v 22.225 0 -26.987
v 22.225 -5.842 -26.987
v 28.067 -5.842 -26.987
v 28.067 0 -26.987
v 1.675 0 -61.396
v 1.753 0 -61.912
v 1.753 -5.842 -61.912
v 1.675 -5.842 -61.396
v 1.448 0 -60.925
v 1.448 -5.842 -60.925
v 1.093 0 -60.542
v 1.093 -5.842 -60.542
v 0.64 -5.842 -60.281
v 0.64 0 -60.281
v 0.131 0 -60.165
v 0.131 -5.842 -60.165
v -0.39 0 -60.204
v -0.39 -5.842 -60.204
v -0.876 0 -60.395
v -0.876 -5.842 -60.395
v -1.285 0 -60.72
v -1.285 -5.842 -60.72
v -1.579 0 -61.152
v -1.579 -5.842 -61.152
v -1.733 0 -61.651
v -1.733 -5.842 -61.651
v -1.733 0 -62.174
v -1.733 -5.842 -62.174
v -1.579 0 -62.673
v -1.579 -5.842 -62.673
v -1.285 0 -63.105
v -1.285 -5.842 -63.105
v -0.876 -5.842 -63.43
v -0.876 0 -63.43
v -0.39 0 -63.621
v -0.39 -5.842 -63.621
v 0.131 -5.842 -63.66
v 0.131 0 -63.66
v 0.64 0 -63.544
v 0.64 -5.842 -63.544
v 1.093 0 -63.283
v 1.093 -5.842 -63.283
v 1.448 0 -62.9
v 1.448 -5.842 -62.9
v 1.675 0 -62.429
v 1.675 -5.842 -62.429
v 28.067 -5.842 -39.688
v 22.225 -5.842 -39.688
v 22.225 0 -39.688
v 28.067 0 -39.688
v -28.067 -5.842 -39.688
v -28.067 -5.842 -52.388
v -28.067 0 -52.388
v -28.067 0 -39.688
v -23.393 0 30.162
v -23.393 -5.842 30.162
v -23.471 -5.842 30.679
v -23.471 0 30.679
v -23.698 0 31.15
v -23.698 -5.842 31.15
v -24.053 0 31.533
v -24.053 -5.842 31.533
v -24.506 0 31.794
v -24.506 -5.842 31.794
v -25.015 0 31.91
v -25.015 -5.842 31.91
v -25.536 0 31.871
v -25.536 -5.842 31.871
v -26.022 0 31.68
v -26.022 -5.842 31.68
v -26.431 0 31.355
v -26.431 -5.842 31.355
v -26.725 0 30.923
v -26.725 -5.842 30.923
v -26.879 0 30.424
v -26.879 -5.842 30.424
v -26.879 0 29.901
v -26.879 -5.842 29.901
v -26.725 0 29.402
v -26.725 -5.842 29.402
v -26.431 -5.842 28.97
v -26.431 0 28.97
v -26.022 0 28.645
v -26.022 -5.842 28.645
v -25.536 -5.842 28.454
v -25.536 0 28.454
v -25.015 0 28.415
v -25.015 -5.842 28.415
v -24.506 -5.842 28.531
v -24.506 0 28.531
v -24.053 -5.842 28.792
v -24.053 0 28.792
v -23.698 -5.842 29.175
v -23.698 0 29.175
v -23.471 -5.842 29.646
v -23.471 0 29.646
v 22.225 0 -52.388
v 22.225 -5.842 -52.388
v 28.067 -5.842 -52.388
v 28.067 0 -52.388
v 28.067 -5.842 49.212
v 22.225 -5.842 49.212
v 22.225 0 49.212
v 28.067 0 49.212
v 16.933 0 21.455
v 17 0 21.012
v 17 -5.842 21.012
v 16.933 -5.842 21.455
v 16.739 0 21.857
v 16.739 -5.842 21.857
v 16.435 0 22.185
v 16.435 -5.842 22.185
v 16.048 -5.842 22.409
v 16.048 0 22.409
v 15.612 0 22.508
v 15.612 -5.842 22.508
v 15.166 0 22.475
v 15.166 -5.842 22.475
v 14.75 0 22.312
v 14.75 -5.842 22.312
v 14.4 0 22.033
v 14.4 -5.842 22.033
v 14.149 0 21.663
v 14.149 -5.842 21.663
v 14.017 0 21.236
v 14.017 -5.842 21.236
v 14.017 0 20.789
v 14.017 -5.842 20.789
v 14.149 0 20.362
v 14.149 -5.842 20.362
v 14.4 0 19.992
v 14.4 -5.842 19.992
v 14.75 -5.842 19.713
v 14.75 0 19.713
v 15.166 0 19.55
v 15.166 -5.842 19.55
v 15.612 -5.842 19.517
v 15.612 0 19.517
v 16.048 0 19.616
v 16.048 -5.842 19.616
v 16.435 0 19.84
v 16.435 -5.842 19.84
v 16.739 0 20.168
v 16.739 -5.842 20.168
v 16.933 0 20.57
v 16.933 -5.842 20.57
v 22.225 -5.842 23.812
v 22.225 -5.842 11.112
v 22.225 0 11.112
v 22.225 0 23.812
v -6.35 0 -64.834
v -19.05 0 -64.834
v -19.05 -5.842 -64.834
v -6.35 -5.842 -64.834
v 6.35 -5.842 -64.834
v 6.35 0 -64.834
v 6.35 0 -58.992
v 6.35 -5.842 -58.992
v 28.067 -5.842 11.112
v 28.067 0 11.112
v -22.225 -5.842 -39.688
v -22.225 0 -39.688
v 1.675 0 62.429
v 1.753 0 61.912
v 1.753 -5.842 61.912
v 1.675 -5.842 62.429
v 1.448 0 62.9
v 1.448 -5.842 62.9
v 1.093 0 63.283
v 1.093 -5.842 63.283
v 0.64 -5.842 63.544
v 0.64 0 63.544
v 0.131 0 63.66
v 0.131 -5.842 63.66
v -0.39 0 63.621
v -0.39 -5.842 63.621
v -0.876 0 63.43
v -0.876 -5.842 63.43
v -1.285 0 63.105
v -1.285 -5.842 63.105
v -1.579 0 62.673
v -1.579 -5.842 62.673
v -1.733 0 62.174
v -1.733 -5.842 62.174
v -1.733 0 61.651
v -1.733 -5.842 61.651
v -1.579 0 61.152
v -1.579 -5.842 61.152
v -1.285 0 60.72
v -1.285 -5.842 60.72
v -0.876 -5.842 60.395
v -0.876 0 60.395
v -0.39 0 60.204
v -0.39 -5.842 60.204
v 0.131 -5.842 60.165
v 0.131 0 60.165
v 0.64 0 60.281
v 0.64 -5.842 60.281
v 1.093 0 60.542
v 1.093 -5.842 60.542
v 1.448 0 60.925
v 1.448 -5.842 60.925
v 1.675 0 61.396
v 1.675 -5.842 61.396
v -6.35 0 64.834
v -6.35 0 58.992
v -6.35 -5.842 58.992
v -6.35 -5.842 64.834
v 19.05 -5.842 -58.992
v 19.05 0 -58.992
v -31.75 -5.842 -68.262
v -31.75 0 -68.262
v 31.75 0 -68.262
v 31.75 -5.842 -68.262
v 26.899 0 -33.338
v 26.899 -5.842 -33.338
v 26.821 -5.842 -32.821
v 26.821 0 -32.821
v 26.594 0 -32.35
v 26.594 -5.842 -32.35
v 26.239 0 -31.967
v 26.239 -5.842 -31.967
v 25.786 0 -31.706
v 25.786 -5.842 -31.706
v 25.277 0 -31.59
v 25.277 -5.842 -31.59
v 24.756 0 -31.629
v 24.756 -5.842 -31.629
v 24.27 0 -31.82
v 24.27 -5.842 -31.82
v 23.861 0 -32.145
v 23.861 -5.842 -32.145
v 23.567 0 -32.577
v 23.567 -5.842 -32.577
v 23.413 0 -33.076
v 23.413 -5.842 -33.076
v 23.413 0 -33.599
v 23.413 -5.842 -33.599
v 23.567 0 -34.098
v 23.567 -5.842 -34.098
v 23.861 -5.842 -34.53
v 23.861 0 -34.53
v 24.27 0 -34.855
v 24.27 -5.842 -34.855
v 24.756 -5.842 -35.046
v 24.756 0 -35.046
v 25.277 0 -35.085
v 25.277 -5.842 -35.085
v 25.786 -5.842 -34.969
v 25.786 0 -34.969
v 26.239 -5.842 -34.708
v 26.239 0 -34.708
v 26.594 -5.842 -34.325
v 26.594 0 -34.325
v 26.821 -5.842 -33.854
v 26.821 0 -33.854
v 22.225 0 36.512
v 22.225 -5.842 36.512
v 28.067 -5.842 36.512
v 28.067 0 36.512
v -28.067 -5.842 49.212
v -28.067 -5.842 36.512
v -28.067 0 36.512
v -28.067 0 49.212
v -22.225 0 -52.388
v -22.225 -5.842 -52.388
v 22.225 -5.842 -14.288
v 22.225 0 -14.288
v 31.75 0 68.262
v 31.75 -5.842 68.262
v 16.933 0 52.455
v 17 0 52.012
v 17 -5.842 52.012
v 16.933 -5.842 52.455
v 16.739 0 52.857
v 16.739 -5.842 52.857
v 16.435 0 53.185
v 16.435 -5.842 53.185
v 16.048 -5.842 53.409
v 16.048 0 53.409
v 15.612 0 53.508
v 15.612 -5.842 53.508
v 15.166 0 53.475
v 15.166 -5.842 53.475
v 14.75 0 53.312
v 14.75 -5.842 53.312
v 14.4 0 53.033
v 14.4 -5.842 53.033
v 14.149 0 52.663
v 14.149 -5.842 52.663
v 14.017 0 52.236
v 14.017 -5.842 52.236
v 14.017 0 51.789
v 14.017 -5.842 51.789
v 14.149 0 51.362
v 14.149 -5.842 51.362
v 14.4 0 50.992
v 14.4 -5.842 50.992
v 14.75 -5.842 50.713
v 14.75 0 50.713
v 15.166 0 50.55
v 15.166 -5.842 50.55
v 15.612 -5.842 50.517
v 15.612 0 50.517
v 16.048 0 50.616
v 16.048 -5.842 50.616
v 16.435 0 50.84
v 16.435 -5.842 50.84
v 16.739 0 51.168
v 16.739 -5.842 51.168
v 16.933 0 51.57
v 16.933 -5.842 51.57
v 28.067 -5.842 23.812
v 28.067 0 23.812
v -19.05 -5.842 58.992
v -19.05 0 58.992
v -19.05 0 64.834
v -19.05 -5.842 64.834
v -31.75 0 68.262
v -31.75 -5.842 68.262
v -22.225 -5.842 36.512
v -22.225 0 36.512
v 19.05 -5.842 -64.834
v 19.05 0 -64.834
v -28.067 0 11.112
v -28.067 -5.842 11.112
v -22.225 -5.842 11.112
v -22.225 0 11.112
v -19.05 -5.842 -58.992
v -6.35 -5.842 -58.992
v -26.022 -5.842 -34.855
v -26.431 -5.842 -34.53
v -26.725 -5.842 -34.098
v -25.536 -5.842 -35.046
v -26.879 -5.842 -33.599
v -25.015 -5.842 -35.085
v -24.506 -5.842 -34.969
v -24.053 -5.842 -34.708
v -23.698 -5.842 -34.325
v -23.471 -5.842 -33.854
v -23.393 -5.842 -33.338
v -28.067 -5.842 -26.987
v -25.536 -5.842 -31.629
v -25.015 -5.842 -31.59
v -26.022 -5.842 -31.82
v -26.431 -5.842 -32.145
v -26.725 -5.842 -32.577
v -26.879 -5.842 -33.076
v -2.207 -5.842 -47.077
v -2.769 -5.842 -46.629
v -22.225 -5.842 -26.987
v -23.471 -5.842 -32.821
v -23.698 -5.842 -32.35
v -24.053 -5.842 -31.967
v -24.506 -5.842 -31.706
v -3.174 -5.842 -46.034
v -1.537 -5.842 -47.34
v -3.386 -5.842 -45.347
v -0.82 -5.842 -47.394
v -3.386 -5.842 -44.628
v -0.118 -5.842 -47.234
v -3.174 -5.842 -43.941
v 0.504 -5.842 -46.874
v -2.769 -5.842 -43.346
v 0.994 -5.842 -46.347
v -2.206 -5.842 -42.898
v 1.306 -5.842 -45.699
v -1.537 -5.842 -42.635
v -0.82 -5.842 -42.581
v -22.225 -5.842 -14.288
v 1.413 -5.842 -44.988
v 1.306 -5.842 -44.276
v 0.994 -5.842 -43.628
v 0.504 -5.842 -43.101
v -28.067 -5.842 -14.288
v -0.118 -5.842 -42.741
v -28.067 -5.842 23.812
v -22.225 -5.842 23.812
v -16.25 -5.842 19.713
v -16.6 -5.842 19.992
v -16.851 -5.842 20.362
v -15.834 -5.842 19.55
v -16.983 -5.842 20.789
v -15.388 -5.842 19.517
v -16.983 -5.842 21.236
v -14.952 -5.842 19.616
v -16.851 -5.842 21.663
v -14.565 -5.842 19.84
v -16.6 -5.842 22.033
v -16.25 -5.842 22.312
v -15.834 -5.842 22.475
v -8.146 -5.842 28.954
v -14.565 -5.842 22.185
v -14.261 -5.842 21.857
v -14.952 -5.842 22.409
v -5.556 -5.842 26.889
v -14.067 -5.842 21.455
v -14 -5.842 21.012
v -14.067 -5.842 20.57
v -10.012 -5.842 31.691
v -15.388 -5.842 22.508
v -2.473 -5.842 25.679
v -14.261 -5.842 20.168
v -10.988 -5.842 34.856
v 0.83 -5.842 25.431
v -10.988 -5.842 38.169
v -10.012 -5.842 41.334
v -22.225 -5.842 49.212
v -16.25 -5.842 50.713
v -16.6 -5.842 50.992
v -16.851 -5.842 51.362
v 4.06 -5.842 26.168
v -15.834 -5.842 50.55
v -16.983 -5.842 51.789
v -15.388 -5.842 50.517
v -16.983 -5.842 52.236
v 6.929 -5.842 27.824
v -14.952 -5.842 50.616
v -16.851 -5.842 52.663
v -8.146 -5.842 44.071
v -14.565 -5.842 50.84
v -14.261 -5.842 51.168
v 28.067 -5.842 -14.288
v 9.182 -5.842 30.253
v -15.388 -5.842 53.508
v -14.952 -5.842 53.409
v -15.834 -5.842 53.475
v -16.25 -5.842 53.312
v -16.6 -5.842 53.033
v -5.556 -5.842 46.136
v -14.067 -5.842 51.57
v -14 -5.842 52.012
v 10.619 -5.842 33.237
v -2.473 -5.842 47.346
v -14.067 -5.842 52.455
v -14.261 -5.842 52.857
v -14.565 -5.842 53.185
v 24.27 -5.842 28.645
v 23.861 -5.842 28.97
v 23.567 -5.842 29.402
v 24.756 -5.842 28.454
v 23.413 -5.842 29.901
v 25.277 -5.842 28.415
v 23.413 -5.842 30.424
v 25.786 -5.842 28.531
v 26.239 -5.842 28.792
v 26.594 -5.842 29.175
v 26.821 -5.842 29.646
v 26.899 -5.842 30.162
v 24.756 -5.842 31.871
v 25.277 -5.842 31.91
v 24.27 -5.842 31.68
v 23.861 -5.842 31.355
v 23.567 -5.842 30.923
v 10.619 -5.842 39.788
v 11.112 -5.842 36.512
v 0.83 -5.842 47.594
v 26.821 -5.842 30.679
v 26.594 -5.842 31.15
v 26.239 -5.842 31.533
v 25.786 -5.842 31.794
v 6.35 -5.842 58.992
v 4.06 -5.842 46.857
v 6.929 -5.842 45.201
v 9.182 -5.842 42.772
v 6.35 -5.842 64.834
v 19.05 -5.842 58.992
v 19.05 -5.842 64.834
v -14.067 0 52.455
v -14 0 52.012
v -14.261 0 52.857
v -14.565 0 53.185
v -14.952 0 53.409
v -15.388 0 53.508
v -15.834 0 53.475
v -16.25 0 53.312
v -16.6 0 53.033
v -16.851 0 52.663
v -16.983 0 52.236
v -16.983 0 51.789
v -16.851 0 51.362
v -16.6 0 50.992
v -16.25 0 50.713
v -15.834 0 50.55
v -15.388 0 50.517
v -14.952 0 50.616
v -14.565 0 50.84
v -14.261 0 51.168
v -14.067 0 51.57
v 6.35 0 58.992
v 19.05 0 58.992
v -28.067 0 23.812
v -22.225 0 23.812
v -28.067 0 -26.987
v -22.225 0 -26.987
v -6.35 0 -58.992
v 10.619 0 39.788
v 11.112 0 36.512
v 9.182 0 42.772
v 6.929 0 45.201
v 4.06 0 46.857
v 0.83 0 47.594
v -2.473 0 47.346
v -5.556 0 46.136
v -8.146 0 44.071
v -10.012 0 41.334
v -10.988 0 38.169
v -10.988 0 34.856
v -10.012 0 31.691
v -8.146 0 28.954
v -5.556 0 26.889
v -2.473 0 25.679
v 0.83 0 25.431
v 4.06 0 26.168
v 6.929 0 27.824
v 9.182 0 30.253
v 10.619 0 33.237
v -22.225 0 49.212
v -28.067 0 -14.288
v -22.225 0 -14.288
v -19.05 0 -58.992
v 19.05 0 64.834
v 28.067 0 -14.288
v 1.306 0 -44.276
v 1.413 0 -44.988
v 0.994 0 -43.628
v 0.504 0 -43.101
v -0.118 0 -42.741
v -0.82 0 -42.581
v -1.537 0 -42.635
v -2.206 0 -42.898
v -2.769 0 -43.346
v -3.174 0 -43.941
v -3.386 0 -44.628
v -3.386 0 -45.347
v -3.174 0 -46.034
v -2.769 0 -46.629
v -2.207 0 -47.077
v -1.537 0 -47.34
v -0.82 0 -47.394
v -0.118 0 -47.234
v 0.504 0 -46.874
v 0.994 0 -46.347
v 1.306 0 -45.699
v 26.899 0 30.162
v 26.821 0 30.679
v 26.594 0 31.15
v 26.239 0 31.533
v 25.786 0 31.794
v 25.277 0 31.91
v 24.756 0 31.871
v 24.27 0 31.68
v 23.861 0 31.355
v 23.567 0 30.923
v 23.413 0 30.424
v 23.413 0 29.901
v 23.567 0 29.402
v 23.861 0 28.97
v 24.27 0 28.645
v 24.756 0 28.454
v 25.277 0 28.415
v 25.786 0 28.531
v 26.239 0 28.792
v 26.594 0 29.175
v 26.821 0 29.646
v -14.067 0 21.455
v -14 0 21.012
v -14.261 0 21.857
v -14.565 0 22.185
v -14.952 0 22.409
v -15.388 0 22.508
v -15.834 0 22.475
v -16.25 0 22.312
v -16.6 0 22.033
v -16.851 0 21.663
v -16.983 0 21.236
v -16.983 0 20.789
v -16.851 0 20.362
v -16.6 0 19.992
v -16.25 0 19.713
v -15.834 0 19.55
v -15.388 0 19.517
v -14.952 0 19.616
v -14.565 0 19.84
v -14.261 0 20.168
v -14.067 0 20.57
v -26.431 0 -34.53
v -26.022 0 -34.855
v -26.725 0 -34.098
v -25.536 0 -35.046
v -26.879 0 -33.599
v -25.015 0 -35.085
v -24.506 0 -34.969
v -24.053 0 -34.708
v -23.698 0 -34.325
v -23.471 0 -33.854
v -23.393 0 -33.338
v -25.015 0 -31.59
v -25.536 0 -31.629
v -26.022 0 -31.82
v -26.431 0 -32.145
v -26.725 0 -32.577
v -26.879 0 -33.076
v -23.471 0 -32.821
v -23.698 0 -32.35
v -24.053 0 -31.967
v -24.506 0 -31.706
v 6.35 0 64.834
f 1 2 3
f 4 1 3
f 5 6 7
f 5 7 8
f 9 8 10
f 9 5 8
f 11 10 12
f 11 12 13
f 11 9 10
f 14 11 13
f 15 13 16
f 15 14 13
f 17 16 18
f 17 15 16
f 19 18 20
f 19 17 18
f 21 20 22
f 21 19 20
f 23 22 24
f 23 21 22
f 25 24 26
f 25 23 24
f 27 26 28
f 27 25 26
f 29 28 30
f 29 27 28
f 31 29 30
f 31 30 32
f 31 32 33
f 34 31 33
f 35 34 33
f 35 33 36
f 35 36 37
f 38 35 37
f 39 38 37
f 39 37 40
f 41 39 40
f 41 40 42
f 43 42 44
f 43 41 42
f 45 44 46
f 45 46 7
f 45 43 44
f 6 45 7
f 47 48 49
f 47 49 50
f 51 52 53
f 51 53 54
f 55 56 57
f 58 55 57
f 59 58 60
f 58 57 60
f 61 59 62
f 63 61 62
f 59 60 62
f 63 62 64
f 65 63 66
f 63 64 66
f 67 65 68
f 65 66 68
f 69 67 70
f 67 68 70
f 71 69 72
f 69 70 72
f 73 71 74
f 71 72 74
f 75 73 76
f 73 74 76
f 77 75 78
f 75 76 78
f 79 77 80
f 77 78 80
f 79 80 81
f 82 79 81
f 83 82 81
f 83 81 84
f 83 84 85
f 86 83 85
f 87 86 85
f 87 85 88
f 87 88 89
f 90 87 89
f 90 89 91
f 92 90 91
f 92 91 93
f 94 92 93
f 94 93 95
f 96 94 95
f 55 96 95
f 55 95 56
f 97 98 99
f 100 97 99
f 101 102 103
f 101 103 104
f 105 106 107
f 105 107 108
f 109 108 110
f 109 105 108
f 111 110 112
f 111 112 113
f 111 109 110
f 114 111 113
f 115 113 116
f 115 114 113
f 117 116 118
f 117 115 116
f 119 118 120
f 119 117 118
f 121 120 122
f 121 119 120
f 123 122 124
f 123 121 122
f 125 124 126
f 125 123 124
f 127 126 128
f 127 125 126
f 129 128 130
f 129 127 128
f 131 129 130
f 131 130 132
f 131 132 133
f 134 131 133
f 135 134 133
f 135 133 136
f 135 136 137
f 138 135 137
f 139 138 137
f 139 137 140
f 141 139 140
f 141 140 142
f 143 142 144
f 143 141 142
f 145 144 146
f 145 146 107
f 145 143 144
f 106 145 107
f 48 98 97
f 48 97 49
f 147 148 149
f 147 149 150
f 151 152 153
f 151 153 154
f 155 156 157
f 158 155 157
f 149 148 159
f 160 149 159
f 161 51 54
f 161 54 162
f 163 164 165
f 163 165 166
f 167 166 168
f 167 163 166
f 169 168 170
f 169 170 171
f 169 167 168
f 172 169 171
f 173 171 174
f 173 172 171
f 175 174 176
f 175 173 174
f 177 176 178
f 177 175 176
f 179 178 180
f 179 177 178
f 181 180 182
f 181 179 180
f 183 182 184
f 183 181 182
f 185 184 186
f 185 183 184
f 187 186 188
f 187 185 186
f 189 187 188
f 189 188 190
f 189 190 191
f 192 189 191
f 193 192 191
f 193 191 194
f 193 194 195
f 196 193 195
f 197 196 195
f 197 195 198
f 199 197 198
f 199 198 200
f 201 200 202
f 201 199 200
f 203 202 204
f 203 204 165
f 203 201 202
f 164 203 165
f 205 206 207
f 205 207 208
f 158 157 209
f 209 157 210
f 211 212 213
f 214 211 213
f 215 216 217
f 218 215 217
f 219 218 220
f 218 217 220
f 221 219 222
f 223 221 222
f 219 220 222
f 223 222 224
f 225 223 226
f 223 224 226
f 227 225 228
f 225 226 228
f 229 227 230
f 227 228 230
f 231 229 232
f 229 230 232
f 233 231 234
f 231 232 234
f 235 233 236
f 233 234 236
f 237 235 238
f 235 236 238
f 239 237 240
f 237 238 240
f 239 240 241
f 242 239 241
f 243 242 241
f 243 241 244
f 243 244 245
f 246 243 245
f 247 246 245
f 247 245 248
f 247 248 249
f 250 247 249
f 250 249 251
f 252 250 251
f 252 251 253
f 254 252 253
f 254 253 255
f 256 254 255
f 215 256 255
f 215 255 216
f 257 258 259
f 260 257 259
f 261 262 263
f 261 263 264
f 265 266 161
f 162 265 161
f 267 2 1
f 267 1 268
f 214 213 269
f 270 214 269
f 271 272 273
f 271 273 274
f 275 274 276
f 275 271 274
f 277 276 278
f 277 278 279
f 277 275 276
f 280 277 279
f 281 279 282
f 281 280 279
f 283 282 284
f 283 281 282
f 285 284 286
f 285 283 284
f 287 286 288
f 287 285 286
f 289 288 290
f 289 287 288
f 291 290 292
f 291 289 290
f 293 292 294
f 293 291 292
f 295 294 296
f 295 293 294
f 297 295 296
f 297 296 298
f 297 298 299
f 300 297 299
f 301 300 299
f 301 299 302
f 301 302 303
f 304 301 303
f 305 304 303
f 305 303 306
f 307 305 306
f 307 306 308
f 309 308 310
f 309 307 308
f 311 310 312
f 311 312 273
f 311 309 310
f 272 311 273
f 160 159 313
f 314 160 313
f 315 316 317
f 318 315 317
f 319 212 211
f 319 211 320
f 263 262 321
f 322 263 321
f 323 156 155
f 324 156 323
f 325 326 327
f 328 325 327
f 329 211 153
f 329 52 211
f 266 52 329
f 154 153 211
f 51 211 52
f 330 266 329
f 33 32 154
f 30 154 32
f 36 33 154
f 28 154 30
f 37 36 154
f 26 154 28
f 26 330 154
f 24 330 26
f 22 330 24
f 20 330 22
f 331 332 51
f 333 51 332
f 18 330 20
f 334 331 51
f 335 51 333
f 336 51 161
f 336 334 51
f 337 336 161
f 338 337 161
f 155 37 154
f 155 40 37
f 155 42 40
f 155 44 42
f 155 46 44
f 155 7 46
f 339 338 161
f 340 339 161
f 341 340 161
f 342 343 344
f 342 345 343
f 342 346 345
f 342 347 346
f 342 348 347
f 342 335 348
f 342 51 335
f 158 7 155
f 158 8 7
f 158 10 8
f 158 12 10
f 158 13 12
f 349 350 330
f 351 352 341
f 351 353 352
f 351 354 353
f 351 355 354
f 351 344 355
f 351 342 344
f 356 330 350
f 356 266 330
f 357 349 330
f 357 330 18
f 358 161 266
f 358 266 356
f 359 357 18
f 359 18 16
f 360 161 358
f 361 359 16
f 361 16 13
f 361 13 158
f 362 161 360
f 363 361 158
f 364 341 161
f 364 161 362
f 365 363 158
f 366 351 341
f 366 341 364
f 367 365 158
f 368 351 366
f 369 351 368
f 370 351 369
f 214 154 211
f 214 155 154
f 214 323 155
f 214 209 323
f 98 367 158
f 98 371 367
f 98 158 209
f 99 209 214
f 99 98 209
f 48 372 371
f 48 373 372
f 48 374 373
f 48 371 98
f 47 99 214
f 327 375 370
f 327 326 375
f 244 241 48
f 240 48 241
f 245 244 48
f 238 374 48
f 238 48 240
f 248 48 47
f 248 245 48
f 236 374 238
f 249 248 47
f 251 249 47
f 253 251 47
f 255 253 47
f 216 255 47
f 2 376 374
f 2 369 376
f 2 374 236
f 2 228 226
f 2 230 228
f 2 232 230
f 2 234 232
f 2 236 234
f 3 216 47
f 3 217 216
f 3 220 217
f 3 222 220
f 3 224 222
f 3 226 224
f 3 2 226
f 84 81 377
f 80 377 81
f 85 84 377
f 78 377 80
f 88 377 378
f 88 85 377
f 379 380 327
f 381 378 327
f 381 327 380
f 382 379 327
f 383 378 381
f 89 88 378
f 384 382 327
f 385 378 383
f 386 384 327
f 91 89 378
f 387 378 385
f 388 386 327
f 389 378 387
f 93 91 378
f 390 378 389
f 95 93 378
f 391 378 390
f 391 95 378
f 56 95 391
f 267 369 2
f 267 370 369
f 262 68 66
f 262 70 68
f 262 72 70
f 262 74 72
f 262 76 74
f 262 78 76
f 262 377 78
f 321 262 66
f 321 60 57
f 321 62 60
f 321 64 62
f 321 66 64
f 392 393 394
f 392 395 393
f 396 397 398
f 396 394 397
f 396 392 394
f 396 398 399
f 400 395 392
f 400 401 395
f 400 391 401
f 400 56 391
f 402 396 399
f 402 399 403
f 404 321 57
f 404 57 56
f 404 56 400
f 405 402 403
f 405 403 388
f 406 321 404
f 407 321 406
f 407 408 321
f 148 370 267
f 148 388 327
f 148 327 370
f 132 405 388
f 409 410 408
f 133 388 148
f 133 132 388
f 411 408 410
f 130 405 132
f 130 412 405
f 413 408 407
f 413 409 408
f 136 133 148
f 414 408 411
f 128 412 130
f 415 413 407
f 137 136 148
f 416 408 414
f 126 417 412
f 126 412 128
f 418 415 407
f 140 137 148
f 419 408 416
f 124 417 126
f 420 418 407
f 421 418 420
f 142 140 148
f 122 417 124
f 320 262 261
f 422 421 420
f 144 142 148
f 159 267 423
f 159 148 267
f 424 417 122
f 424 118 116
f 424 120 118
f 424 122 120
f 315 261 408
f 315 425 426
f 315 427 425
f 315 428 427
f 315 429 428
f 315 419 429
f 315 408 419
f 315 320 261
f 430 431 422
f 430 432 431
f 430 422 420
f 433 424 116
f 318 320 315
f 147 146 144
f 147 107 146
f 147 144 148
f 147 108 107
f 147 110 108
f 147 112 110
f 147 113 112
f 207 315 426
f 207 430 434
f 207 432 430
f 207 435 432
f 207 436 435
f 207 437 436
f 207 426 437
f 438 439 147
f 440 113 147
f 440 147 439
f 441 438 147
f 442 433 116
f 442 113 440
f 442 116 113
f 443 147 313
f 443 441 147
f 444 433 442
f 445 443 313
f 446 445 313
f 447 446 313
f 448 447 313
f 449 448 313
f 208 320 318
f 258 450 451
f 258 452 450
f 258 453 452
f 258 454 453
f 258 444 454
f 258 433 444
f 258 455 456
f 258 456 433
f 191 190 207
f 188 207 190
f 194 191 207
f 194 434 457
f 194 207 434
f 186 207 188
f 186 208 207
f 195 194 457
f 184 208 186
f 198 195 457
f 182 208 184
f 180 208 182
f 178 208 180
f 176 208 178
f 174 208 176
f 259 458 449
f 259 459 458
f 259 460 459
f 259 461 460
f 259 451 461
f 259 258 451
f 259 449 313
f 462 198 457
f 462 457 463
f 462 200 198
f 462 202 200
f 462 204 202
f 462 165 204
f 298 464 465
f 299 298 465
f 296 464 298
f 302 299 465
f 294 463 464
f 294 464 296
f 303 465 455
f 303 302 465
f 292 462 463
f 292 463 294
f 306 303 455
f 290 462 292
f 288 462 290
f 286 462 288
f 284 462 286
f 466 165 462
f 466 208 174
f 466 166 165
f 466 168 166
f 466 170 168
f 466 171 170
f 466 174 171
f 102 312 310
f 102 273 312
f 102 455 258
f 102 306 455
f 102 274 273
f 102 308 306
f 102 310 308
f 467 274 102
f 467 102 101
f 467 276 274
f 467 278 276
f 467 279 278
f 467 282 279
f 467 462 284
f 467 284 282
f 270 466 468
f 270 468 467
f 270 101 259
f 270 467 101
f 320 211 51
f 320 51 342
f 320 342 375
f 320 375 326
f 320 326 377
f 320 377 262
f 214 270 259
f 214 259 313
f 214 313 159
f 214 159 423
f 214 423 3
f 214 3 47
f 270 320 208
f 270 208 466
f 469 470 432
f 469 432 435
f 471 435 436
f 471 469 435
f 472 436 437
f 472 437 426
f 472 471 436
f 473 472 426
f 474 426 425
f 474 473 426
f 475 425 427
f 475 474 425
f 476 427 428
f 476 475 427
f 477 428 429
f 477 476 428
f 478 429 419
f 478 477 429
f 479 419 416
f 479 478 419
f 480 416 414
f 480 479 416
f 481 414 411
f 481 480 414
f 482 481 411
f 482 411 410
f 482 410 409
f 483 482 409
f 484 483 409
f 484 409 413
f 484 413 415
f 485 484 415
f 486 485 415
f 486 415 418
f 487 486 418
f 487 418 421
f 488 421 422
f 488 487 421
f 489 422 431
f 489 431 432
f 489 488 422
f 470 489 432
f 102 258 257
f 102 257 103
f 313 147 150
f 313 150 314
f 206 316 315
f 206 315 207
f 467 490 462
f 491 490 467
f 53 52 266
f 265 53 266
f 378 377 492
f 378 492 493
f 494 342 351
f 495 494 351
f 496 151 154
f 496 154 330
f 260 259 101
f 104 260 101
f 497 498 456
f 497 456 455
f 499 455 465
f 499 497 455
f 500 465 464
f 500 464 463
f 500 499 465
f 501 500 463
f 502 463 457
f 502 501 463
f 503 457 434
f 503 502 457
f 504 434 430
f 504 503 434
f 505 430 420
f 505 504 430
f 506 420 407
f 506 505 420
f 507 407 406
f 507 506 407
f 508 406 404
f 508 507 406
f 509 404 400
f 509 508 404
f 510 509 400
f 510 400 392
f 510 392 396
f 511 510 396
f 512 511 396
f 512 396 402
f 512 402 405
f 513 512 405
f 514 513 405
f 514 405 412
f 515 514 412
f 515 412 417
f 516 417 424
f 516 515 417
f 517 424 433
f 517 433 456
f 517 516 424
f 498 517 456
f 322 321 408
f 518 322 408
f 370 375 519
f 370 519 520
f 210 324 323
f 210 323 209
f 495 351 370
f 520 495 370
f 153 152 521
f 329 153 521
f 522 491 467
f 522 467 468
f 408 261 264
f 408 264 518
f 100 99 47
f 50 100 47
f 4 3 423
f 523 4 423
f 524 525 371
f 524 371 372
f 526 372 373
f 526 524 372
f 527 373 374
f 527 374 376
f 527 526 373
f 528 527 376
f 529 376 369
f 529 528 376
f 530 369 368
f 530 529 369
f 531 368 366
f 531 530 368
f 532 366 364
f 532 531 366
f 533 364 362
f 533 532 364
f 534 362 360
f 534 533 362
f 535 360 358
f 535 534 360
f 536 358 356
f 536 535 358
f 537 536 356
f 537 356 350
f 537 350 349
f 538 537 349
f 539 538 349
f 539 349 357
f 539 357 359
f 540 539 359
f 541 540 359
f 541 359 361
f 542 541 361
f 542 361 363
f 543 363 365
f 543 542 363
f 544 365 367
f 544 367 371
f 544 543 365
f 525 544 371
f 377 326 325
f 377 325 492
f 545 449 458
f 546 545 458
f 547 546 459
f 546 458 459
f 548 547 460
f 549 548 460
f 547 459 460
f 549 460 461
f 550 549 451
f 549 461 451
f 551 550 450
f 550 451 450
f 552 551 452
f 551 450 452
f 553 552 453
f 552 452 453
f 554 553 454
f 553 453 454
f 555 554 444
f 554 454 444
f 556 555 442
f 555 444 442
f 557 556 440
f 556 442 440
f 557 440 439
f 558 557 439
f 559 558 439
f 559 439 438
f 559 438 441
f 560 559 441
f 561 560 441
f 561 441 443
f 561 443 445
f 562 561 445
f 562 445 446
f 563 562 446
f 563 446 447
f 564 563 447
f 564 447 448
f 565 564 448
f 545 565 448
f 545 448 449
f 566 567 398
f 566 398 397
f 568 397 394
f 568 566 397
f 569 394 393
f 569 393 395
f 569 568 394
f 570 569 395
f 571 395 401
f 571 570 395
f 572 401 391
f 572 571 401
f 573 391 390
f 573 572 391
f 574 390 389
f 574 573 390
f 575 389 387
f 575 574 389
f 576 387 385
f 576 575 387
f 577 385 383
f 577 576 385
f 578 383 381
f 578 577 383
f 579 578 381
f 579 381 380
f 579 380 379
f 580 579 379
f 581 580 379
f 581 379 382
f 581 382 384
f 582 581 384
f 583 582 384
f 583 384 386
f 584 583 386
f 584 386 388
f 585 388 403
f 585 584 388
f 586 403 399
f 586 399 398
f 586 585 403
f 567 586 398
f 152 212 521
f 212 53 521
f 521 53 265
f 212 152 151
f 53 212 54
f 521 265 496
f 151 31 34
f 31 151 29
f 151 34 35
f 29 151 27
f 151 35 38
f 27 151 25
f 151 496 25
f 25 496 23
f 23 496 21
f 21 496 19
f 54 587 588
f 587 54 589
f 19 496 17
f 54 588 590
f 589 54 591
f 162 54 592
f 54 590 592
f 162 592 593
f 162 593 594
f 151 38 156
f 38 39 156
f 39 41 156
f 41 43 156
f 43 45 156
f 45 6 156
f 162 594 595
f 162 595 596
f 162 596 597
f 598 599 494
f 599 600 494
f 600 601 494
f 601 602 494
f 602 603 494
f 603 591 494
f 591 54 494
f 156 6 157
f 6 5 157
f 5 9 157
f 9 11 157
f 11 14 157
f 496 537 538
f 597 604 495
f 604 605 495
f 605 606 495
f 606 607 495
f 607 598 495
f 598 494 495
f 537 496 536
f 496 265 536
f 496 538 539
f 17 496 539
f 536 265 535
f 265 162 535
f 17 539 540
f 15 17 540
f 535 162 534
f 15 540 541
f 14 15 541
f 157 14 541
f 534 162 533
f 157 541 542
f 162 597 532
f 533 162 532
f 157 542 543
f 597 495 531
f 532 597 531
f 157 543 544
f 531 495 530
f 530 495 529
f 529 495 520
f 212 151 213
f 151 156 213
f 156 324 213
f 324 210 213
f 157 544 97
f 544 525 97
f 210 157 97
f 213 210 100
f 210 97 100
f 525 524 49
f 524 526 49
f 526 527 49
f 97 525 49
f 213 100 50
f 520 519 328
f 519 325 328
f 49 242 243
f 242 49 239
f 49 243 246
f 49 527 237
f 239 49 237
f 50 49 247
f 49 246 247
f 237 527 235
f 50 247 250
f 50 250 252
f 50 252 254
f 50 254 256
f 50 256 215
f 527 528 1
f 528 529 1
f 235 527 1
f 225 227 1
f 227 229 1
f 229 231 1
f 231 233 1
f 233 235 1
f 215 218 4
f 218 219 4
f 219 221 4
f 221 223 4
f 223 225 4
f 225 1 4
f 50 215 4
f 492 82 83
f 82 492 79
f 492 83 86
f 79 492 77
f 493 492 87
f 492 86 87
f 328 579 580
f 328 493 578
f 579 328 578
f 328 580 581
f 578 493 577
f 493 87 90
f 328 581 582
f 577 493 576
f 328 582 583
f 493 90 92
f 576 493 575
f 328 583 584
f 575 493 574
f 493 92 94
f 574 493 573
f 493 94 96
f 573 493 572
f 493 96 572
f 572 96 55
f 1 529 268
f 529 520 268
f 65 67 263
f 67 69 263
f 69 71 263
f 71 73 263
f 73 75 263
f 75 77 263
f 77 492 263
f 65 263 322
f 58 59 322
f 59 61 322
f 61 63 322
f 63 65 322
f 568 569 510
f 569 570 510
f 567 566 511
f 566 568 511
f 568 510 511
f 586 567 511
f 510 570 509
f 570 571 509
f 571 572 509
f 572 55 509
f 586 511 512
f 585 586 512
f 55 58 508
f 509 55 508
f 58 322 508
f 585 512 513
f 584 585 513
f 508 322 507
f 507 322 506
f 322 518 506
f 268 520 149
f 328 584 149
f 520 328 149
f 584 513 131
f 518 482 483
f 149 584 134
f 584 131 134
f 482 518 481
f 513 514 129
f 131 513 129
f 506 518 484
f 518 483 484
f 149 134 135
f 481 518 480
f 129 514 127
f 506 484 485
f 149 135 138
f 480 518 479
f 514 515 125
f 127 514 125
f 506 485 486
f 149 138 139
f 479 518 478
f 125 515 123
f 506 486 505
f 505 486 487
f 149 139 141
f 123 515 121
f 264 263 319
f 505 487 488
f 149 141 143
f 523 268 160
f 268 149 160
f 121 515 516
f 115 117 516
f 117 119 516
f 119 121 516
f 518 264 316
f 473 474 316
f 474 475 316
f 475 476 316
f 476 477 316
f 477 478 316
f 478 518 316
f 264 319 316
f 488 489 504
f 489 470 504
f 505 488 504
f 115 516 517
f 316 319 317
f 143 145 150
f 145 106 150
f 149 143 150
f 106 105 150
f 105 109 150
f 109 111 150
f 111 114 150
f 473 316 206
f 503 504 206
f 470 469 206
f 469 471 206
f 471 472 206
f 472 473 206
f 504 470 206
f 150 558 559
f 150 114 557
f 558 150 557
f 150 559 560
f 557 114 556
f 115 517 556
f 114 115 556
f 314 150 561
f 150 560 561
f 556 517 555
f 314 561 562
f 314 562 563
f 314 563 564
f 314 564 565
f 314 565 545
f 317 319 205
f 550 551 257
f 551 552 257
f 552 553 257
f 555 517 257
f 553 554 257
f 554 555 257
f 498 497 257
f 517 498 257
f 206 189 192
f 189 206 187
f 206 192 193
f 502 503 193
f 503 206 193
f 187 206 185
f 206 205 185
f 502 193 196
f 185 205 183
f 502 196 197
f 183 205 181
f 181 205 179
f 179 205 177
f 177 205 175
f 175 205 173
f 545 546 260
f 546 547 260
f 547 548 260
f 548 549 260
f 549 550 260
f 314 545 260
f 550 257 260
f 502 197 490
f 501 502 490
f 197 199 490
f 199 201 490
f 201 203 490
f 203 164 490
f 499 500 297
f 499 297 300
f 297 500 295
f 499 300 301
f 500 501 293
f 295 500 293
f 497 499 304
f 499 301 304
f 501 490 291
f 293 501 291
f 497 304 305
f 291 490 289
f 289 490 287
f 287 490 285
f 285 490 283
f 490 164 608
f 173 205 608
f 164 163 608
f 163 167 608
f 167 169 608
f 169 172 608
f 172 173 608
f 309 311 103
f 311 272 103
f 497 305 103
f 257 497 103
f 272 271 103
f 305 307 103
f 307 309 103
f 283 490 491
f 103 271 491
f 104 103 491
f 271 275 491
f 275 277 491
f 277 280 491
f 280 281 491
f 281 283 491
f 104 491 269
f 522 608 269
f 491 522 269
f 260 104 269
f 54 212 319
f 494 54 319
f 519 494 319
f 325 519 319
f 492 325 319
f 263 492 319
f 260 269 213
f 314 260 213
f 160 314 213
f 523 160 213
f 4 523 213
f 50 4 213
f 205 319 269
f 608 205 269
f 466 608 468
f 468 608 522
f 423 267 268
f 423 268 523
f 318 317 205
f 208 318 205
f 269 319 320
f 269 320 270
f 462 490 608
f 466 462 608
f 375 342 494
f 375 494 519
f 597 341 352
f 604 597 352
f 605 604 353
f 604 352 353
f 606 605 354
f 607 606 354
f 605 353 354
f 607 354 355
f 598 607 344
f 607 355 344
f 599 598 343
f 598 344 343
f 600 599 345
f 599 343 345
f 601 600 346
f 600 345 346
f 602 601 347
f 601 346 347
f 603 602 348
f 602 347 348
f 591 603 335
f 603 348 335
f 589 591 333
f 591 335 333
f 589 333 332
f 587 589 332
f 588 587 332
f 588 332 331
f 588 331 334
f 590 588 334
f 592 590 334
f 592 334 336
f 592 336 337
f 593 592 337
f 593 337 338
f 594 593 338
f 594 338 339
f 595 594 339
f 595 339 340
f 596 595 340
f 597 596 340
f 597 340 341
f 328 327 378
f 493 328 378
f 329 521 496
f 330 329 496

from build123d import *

# Parameters (mm, degrees)
F0_W     = 63.5
F0_H     = 136.525
F0_W_2   = 12.7
F0_H_2   = 5.842
F0_R     = 2.413
F0_R_2   = 1.7526
F0_R_3   = 1.5
F0_R_4   = 11.1125
F1_DEPTH = 5.842
F2_W     = 5.842
F2_H     = 12.7
F2_R     = 1.7526
F3_DEPTH = 25.4


with BuildPart() as f1:
    # F0 (on Front) → F1 (new body)
    with BuildSketch(Plane.XZ):
        Rectangle(F0_W, F0_H)
        with Locations((-12.7, -61.9125)):
            Rectangle(F0_W_2, F0_H_2, mode=Mode.SUBTRACT)
        with Locations((-1, -44.9875)):
            Circle(F0_R, mode=Mode.SUBTRACT)
        with Locations((0, -61.9125)):
            Circle(F0_R_2, mode=Mode.SUBTRACT)
        with Locations((12.7, -61.9125)):
            Rectangle(F0_W_2, F0_H_2, mode=Mode.SUBTRACT)
        with Locations((-15.5, 21.0125)):
            Circle(F0_R_3, mode=Mode.SUBTRACT)
        with Locations((-15.5, 52.0125)):
            Circle(F0_R_3, mode=Mode.SUBTRACT)
        with Locations((-12.7, 61.9125)):
            Rectangle(F0_W_2, F0_H_2, mode=Mode.SUBTRACT)
        with Locations((15.5, 21.0125)):
            Circle(F0_R_3, mode=Mode.SUBTRACT)
        with Locations((0, 36.5125)):
            Circle(F0_R_4, mode=Mode.SUBTRACT)
        with Locations((0, 61.9125)):
            Circle(F0_R_2, mode=Mode.SUBTRACT)
        with Locations((15.5, 52.0125)):
            Circle(F0_R_3, mode=Mode.SUBTRACT)
        with Locations((12.7, 61.9125)):
            Rectangle(F0_W_2, F0_H_2, mode=Mode.SUBTRACT)
    extrude(amount=F1_DEPTH)

    # F2 (on face) → F3 (cut)
    with BuildSketch(Plane.XZ.offset(5.842)):
        with Locations((-25.146, 42.8625)):
            Rectangle(F2_W, F2_H)
        with Locations((-25.146, 17.4625)):
            Rectangle(F2_W, F2_H)
        with Locations((-25.146, 30.1625)):
            Circle(F2_R)
        with Locations((25.146, 17.4625)):
            Rectangle(F2_W, F2_H)
        with Locations((25.146, 42.8625)):
            Rectangle(F2_W, F2_H)
        with Locations((25.146, 30.1625)):
            Circle(F2_R)
        with Locations((-25.146, -20.6375)):
            Rectangle(F2_W, F2_H)
        with Locations((-25.146, -33.3375)):
            Circle(F2_R)
        with Locations((-25.146, -46.0375)):
            Rectangle(F2_W, F2_H)
        with Locations((25.146, -20.6375)):
            Rectangle(F2_W, F2_H)
        with Locations((25.146, -46.0375)):
            Rectangle(F2_W, F2_H)
        with Locations((25.146, -33.3375)):
            Circle(F2_R)
    extrude(amount=-F3_DEPTH, mode=Mode.SUBTRACT)


solid = f1.part
